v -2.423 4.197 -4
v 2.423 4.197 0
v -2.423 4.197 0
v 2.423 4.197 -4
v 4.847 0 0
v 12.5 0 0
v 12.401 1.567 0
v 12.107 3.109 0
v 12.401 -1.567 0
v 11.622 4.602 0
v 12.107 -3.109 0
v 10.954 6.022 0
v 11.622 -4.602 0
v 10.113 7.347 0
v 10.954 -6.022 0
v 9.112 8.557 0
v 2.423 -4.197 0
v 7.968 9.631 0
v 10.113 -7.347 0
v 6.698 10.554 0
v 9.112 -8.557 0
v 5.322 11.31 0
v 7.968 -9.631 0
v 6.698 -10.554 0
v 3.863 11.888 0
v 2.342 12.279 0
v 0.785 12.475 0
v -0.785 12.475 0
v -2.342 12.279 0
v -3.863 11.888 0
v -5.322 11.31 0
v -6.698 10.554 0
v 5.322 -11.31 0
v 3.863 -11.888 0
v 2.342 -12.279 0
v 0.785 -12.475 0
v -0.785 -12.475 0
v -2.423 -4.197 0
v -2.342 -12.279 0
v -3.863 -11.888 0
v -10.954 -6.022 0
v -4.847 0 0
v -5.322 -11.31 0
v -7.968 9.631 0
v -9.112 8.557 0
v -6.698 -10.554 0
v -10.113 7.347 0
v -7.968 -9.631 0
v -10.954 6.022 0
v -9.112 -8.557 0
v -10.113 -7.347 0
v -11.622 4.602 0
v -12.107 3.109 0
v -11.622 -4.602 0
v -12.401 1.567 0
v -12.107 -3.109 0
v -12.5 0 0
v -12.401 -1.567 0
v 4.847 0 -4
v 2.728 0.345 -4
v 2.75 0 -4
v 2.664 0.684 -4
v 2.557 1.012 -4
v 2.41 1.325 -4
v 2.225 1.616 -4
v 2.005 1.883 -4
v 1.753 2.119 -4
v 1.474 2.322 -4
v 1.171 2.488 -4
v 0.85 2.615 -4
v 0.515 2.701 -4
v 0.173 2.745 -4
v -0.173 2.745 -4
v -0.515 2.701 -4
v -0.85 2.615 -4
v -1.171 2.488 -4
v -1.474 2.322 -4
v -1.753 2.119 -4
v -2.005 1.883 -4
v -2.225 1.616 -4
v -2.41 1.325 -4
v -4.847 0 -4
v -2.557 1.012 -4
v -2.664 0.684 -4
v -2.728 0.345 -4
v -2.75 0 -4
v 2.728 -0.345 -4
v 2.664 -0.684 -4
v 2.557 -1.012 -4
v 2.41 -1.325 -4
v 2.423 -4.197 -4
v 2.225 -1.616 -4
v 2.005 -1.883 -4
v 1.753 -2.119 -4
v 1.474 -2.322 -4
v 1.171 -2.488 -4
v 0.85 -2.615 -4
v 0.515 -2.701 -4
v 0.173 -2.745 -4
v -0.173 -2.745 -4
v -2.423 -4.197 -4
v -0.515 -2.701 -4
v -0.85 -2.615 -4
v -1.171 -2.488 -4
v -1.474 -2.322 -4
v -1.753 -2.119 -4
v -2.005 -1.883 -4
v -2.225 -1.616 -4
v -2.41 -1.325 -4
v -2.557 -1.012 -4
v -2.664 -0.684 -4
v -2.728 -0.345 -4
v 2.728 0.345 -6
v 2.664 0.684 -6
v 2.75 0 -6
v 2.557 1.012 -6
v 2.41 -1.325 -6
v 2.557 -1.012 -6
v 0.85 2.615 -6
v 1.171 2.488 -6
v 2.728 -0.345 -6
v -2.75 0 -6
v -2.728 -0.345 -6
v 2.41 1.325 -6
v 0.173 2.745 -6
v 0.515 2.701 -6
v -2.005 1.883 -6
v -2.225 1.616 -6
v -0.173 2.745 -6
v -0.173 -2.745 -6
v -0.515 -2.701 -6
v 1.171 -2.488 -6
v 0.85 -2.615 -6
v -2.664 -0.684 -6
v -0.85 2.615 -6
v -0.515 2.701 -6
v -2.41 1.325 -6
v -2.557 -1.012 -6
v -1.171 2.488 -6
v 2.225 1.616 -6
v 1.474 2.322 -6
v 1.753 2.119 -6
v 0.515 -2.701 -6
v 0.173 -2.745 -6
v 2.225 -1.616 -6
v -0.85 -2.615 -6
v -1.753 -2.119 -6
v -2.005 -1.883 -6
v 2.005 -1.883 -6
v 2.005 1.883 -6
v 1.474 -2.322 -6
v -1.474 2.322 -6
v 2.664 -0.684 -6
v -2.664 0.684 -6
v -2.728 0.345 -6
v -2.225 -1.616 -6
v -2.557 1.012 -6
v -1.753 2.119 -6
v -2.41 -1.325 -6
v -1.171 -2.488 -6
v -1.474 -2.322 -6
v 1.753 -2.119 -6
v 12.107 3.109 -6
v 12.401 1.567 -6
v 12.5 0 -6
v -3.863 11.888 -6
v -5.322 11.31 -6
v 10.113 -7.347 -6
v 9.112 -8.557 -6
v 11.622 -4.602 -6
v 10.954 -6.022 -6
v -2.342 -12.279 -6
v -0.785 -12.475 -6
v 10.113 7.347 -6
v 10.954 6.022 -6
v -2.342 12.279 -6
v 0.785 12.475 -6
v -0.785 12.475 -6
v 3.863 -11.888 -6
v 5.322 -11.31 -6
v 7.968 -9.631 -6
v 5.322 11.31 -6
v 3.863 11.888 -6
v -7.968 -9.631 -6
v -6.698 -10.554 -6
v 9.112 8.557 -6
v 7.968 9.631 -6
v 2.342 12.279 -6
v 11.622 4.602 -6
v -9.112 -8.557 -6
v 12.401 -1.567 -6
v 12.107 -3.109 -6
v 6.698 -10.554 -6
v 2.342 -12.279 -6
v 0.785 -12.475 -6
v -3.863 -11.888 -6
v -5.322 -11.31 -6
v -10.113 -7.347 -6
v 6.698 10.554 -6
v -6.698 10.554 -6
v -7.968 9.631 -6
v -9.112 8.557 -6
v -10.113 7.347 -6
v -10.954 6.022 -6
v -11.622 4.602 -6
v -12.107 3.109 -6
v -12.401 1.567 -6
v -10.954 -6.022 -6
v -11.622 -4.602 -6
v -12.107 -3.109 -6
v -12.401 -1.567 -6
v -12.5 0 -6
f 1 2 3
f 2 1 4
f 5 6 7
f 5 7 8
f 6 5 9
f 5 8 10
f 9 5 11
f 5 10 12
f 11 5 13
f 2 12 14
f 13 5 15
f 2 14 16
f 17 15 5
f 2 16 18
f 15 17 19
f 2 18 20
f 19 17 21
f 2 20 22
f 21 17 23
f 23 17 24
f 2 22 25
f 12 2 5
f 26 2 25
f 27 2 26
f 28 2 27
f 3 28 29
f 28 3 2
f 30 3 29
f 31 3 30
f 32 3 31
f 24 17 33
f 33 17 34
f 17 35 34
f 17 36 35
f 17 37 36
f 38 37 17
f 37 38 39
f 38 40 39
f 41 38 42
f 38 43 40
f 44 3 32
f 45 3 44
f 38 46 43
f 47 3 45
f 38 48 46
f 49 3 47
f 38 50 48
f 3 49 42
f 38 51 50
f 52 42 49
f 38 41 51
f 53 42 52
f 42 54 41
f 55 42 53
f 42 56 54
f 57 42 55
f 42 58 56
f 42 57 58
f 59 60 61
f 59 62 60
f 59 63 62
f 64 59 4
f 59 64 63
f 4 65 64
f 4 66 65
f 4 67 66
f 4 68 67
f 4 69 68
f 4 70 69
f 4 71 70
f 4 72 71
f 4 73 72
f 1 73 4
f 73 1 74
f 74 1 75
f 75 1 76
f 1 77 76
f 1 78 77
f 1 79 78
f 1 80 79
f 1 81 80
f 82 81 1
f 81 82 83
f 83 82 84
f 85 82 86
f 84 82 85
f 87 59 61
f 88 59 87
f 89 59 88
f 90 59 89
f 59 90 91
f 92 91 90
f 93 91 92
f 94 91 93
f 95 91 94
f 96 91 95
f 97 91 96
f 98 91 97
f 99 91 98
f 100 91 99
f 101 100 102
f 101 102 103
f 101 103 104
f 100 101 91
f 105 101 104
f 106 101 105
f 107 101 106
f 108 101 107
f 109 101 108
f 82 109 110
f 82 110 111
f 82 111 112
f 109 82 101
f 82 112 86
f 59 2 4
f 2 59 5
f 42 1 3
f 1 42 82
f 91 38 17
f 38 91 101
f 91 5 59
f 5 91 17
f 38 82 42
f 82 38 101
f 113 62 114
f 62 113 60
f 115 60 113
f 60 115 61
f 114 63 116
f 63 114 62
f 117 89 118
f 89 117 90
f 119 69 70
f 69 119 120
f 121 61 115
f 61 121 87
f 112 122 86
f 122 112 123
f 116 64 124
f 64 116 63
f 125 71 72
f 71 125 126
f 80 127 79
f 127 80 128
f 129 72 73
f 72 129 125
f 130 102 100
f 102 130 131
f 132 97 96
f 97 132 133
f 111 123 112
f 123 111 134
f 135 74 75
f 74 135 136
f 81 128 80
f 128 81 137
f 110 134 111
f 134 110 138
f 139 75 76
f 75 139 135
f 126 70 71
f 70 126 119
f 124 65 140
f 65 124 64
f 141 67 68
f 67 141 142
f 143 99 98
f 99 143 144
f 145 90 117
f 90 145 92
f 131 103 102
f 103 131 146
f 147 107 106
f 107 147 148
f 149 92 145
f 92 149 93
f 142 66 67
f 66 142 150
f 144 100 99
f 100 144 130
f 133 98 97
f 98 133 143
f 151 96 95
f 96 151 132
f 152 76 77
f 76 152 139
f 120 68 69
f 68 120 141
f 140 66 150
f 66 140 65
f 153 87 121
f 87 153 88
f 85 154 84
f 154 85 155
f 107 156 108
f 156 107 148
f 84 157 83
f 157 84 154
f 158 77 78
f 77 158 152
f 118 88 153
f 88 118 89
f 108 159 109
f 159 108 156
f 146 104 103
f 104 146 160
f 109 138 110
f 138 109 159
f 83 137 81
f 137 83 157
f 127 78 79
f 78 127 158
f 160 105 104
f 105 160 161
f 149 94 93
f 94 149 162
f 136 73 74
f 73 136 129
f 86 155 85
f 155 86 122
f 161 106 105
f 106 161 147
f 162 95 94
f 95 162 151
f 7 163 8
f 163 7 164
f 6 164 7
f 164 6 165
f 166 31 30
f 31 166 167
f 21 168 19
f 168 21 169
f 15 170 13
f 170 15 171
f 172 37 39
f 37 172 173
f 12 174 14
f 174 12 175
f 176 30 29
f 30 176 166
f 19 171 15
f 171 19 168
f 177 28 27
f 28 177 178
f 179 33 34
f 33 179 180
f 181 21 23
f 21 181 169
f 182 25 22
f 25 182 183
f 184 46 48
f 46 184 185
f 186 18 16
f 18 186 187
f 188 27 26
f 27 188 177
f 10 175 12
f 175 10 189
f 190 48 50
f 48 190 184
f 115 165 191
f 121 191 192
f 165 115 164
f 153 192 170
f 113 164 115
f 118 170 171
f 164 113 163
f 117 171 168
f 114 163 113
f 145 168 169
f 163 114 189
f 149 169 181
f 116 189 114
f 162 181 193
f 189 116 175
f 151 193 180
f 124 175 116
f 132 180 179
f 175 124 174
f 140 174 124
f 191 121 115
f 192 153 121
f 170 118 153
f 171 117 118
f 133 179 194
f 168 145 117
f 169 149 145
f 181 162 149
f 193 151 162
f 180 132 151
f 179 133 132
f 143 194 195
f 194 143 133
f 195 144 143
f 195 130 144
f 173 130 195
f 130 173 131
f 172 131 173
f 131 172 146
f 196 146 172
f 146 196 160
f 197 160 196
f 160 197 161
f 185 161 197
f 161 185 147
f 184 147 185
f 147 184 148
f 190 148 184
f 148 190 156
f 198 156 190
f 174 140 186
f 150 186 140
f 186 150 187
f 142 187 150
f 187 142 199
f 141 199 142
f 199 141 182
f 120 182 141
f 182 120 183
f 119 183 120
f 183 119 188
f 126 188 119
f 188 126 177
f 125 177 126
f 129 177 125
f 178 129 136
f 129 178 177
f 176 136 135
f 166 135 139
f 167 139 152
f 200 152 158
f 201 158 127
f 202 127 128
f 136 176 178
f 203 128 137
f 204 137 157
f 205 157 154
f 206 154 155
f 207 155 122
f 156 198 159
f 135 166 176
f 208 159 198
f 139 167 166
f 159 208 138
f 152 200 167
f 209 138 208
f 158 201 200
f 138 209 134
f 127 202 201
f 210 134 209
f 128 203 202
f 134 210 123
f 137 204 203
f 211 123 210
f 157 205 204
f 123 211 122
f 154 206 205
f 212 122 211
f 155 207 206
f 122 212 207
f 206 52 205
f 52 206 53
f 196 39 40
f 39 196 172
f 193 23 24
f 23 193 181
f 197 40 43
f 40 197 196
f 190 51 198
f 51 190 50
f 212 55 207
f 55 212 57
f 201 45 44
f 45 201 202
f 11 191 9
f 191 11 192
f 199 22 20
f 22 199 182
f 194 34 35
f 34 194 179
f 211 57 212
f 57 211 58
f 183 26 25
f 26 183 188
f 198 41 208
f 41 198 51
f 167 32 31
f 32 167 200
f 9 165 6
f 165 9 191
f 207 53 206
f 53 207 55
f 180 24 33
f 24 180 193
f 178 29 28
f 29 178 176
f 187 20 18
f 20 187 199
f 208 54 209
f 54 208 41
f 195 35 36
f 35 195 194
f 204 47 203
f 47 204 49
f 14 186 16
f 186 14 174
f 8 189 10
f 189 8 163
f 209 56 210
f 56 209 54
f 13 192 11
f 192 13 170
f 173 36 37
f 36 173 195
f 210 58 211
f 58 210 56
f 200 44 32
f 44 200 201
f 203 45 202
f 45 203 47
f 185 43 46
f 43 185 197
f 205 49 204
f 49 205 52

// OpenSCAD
$fn = 50;

difference() {
	union() {
		translate(v = [0, 0, -6.0]) {
			cylinder(h = 6.0, r = 12.5);
		}
	}
	union() {
		translate(v = [0, 0, 0]) {
			rotate(a = [0, 0, 0]) {
				difference() {
					union() {
						translate(v = [0, 0, -4]) {
							linear_extrude(height = 4) {
								polygon(points = [[4.8468, 0.0], [2.4234000000000004, 4.197451927062417], [-2.423399999999999, 4.197451927062417], [-4.8468, 5.935618106107392e-16], [-2.423400000000002, -4.197451927062416], [2.423399999999997, -4.197451927062419]]);
							}
						}
					}
					union();
				}
			}
		}
		#translate(v = [0, 0, -100.0]) {
			cylinder(h = 200, r = 2.75);
		}
	}
}
